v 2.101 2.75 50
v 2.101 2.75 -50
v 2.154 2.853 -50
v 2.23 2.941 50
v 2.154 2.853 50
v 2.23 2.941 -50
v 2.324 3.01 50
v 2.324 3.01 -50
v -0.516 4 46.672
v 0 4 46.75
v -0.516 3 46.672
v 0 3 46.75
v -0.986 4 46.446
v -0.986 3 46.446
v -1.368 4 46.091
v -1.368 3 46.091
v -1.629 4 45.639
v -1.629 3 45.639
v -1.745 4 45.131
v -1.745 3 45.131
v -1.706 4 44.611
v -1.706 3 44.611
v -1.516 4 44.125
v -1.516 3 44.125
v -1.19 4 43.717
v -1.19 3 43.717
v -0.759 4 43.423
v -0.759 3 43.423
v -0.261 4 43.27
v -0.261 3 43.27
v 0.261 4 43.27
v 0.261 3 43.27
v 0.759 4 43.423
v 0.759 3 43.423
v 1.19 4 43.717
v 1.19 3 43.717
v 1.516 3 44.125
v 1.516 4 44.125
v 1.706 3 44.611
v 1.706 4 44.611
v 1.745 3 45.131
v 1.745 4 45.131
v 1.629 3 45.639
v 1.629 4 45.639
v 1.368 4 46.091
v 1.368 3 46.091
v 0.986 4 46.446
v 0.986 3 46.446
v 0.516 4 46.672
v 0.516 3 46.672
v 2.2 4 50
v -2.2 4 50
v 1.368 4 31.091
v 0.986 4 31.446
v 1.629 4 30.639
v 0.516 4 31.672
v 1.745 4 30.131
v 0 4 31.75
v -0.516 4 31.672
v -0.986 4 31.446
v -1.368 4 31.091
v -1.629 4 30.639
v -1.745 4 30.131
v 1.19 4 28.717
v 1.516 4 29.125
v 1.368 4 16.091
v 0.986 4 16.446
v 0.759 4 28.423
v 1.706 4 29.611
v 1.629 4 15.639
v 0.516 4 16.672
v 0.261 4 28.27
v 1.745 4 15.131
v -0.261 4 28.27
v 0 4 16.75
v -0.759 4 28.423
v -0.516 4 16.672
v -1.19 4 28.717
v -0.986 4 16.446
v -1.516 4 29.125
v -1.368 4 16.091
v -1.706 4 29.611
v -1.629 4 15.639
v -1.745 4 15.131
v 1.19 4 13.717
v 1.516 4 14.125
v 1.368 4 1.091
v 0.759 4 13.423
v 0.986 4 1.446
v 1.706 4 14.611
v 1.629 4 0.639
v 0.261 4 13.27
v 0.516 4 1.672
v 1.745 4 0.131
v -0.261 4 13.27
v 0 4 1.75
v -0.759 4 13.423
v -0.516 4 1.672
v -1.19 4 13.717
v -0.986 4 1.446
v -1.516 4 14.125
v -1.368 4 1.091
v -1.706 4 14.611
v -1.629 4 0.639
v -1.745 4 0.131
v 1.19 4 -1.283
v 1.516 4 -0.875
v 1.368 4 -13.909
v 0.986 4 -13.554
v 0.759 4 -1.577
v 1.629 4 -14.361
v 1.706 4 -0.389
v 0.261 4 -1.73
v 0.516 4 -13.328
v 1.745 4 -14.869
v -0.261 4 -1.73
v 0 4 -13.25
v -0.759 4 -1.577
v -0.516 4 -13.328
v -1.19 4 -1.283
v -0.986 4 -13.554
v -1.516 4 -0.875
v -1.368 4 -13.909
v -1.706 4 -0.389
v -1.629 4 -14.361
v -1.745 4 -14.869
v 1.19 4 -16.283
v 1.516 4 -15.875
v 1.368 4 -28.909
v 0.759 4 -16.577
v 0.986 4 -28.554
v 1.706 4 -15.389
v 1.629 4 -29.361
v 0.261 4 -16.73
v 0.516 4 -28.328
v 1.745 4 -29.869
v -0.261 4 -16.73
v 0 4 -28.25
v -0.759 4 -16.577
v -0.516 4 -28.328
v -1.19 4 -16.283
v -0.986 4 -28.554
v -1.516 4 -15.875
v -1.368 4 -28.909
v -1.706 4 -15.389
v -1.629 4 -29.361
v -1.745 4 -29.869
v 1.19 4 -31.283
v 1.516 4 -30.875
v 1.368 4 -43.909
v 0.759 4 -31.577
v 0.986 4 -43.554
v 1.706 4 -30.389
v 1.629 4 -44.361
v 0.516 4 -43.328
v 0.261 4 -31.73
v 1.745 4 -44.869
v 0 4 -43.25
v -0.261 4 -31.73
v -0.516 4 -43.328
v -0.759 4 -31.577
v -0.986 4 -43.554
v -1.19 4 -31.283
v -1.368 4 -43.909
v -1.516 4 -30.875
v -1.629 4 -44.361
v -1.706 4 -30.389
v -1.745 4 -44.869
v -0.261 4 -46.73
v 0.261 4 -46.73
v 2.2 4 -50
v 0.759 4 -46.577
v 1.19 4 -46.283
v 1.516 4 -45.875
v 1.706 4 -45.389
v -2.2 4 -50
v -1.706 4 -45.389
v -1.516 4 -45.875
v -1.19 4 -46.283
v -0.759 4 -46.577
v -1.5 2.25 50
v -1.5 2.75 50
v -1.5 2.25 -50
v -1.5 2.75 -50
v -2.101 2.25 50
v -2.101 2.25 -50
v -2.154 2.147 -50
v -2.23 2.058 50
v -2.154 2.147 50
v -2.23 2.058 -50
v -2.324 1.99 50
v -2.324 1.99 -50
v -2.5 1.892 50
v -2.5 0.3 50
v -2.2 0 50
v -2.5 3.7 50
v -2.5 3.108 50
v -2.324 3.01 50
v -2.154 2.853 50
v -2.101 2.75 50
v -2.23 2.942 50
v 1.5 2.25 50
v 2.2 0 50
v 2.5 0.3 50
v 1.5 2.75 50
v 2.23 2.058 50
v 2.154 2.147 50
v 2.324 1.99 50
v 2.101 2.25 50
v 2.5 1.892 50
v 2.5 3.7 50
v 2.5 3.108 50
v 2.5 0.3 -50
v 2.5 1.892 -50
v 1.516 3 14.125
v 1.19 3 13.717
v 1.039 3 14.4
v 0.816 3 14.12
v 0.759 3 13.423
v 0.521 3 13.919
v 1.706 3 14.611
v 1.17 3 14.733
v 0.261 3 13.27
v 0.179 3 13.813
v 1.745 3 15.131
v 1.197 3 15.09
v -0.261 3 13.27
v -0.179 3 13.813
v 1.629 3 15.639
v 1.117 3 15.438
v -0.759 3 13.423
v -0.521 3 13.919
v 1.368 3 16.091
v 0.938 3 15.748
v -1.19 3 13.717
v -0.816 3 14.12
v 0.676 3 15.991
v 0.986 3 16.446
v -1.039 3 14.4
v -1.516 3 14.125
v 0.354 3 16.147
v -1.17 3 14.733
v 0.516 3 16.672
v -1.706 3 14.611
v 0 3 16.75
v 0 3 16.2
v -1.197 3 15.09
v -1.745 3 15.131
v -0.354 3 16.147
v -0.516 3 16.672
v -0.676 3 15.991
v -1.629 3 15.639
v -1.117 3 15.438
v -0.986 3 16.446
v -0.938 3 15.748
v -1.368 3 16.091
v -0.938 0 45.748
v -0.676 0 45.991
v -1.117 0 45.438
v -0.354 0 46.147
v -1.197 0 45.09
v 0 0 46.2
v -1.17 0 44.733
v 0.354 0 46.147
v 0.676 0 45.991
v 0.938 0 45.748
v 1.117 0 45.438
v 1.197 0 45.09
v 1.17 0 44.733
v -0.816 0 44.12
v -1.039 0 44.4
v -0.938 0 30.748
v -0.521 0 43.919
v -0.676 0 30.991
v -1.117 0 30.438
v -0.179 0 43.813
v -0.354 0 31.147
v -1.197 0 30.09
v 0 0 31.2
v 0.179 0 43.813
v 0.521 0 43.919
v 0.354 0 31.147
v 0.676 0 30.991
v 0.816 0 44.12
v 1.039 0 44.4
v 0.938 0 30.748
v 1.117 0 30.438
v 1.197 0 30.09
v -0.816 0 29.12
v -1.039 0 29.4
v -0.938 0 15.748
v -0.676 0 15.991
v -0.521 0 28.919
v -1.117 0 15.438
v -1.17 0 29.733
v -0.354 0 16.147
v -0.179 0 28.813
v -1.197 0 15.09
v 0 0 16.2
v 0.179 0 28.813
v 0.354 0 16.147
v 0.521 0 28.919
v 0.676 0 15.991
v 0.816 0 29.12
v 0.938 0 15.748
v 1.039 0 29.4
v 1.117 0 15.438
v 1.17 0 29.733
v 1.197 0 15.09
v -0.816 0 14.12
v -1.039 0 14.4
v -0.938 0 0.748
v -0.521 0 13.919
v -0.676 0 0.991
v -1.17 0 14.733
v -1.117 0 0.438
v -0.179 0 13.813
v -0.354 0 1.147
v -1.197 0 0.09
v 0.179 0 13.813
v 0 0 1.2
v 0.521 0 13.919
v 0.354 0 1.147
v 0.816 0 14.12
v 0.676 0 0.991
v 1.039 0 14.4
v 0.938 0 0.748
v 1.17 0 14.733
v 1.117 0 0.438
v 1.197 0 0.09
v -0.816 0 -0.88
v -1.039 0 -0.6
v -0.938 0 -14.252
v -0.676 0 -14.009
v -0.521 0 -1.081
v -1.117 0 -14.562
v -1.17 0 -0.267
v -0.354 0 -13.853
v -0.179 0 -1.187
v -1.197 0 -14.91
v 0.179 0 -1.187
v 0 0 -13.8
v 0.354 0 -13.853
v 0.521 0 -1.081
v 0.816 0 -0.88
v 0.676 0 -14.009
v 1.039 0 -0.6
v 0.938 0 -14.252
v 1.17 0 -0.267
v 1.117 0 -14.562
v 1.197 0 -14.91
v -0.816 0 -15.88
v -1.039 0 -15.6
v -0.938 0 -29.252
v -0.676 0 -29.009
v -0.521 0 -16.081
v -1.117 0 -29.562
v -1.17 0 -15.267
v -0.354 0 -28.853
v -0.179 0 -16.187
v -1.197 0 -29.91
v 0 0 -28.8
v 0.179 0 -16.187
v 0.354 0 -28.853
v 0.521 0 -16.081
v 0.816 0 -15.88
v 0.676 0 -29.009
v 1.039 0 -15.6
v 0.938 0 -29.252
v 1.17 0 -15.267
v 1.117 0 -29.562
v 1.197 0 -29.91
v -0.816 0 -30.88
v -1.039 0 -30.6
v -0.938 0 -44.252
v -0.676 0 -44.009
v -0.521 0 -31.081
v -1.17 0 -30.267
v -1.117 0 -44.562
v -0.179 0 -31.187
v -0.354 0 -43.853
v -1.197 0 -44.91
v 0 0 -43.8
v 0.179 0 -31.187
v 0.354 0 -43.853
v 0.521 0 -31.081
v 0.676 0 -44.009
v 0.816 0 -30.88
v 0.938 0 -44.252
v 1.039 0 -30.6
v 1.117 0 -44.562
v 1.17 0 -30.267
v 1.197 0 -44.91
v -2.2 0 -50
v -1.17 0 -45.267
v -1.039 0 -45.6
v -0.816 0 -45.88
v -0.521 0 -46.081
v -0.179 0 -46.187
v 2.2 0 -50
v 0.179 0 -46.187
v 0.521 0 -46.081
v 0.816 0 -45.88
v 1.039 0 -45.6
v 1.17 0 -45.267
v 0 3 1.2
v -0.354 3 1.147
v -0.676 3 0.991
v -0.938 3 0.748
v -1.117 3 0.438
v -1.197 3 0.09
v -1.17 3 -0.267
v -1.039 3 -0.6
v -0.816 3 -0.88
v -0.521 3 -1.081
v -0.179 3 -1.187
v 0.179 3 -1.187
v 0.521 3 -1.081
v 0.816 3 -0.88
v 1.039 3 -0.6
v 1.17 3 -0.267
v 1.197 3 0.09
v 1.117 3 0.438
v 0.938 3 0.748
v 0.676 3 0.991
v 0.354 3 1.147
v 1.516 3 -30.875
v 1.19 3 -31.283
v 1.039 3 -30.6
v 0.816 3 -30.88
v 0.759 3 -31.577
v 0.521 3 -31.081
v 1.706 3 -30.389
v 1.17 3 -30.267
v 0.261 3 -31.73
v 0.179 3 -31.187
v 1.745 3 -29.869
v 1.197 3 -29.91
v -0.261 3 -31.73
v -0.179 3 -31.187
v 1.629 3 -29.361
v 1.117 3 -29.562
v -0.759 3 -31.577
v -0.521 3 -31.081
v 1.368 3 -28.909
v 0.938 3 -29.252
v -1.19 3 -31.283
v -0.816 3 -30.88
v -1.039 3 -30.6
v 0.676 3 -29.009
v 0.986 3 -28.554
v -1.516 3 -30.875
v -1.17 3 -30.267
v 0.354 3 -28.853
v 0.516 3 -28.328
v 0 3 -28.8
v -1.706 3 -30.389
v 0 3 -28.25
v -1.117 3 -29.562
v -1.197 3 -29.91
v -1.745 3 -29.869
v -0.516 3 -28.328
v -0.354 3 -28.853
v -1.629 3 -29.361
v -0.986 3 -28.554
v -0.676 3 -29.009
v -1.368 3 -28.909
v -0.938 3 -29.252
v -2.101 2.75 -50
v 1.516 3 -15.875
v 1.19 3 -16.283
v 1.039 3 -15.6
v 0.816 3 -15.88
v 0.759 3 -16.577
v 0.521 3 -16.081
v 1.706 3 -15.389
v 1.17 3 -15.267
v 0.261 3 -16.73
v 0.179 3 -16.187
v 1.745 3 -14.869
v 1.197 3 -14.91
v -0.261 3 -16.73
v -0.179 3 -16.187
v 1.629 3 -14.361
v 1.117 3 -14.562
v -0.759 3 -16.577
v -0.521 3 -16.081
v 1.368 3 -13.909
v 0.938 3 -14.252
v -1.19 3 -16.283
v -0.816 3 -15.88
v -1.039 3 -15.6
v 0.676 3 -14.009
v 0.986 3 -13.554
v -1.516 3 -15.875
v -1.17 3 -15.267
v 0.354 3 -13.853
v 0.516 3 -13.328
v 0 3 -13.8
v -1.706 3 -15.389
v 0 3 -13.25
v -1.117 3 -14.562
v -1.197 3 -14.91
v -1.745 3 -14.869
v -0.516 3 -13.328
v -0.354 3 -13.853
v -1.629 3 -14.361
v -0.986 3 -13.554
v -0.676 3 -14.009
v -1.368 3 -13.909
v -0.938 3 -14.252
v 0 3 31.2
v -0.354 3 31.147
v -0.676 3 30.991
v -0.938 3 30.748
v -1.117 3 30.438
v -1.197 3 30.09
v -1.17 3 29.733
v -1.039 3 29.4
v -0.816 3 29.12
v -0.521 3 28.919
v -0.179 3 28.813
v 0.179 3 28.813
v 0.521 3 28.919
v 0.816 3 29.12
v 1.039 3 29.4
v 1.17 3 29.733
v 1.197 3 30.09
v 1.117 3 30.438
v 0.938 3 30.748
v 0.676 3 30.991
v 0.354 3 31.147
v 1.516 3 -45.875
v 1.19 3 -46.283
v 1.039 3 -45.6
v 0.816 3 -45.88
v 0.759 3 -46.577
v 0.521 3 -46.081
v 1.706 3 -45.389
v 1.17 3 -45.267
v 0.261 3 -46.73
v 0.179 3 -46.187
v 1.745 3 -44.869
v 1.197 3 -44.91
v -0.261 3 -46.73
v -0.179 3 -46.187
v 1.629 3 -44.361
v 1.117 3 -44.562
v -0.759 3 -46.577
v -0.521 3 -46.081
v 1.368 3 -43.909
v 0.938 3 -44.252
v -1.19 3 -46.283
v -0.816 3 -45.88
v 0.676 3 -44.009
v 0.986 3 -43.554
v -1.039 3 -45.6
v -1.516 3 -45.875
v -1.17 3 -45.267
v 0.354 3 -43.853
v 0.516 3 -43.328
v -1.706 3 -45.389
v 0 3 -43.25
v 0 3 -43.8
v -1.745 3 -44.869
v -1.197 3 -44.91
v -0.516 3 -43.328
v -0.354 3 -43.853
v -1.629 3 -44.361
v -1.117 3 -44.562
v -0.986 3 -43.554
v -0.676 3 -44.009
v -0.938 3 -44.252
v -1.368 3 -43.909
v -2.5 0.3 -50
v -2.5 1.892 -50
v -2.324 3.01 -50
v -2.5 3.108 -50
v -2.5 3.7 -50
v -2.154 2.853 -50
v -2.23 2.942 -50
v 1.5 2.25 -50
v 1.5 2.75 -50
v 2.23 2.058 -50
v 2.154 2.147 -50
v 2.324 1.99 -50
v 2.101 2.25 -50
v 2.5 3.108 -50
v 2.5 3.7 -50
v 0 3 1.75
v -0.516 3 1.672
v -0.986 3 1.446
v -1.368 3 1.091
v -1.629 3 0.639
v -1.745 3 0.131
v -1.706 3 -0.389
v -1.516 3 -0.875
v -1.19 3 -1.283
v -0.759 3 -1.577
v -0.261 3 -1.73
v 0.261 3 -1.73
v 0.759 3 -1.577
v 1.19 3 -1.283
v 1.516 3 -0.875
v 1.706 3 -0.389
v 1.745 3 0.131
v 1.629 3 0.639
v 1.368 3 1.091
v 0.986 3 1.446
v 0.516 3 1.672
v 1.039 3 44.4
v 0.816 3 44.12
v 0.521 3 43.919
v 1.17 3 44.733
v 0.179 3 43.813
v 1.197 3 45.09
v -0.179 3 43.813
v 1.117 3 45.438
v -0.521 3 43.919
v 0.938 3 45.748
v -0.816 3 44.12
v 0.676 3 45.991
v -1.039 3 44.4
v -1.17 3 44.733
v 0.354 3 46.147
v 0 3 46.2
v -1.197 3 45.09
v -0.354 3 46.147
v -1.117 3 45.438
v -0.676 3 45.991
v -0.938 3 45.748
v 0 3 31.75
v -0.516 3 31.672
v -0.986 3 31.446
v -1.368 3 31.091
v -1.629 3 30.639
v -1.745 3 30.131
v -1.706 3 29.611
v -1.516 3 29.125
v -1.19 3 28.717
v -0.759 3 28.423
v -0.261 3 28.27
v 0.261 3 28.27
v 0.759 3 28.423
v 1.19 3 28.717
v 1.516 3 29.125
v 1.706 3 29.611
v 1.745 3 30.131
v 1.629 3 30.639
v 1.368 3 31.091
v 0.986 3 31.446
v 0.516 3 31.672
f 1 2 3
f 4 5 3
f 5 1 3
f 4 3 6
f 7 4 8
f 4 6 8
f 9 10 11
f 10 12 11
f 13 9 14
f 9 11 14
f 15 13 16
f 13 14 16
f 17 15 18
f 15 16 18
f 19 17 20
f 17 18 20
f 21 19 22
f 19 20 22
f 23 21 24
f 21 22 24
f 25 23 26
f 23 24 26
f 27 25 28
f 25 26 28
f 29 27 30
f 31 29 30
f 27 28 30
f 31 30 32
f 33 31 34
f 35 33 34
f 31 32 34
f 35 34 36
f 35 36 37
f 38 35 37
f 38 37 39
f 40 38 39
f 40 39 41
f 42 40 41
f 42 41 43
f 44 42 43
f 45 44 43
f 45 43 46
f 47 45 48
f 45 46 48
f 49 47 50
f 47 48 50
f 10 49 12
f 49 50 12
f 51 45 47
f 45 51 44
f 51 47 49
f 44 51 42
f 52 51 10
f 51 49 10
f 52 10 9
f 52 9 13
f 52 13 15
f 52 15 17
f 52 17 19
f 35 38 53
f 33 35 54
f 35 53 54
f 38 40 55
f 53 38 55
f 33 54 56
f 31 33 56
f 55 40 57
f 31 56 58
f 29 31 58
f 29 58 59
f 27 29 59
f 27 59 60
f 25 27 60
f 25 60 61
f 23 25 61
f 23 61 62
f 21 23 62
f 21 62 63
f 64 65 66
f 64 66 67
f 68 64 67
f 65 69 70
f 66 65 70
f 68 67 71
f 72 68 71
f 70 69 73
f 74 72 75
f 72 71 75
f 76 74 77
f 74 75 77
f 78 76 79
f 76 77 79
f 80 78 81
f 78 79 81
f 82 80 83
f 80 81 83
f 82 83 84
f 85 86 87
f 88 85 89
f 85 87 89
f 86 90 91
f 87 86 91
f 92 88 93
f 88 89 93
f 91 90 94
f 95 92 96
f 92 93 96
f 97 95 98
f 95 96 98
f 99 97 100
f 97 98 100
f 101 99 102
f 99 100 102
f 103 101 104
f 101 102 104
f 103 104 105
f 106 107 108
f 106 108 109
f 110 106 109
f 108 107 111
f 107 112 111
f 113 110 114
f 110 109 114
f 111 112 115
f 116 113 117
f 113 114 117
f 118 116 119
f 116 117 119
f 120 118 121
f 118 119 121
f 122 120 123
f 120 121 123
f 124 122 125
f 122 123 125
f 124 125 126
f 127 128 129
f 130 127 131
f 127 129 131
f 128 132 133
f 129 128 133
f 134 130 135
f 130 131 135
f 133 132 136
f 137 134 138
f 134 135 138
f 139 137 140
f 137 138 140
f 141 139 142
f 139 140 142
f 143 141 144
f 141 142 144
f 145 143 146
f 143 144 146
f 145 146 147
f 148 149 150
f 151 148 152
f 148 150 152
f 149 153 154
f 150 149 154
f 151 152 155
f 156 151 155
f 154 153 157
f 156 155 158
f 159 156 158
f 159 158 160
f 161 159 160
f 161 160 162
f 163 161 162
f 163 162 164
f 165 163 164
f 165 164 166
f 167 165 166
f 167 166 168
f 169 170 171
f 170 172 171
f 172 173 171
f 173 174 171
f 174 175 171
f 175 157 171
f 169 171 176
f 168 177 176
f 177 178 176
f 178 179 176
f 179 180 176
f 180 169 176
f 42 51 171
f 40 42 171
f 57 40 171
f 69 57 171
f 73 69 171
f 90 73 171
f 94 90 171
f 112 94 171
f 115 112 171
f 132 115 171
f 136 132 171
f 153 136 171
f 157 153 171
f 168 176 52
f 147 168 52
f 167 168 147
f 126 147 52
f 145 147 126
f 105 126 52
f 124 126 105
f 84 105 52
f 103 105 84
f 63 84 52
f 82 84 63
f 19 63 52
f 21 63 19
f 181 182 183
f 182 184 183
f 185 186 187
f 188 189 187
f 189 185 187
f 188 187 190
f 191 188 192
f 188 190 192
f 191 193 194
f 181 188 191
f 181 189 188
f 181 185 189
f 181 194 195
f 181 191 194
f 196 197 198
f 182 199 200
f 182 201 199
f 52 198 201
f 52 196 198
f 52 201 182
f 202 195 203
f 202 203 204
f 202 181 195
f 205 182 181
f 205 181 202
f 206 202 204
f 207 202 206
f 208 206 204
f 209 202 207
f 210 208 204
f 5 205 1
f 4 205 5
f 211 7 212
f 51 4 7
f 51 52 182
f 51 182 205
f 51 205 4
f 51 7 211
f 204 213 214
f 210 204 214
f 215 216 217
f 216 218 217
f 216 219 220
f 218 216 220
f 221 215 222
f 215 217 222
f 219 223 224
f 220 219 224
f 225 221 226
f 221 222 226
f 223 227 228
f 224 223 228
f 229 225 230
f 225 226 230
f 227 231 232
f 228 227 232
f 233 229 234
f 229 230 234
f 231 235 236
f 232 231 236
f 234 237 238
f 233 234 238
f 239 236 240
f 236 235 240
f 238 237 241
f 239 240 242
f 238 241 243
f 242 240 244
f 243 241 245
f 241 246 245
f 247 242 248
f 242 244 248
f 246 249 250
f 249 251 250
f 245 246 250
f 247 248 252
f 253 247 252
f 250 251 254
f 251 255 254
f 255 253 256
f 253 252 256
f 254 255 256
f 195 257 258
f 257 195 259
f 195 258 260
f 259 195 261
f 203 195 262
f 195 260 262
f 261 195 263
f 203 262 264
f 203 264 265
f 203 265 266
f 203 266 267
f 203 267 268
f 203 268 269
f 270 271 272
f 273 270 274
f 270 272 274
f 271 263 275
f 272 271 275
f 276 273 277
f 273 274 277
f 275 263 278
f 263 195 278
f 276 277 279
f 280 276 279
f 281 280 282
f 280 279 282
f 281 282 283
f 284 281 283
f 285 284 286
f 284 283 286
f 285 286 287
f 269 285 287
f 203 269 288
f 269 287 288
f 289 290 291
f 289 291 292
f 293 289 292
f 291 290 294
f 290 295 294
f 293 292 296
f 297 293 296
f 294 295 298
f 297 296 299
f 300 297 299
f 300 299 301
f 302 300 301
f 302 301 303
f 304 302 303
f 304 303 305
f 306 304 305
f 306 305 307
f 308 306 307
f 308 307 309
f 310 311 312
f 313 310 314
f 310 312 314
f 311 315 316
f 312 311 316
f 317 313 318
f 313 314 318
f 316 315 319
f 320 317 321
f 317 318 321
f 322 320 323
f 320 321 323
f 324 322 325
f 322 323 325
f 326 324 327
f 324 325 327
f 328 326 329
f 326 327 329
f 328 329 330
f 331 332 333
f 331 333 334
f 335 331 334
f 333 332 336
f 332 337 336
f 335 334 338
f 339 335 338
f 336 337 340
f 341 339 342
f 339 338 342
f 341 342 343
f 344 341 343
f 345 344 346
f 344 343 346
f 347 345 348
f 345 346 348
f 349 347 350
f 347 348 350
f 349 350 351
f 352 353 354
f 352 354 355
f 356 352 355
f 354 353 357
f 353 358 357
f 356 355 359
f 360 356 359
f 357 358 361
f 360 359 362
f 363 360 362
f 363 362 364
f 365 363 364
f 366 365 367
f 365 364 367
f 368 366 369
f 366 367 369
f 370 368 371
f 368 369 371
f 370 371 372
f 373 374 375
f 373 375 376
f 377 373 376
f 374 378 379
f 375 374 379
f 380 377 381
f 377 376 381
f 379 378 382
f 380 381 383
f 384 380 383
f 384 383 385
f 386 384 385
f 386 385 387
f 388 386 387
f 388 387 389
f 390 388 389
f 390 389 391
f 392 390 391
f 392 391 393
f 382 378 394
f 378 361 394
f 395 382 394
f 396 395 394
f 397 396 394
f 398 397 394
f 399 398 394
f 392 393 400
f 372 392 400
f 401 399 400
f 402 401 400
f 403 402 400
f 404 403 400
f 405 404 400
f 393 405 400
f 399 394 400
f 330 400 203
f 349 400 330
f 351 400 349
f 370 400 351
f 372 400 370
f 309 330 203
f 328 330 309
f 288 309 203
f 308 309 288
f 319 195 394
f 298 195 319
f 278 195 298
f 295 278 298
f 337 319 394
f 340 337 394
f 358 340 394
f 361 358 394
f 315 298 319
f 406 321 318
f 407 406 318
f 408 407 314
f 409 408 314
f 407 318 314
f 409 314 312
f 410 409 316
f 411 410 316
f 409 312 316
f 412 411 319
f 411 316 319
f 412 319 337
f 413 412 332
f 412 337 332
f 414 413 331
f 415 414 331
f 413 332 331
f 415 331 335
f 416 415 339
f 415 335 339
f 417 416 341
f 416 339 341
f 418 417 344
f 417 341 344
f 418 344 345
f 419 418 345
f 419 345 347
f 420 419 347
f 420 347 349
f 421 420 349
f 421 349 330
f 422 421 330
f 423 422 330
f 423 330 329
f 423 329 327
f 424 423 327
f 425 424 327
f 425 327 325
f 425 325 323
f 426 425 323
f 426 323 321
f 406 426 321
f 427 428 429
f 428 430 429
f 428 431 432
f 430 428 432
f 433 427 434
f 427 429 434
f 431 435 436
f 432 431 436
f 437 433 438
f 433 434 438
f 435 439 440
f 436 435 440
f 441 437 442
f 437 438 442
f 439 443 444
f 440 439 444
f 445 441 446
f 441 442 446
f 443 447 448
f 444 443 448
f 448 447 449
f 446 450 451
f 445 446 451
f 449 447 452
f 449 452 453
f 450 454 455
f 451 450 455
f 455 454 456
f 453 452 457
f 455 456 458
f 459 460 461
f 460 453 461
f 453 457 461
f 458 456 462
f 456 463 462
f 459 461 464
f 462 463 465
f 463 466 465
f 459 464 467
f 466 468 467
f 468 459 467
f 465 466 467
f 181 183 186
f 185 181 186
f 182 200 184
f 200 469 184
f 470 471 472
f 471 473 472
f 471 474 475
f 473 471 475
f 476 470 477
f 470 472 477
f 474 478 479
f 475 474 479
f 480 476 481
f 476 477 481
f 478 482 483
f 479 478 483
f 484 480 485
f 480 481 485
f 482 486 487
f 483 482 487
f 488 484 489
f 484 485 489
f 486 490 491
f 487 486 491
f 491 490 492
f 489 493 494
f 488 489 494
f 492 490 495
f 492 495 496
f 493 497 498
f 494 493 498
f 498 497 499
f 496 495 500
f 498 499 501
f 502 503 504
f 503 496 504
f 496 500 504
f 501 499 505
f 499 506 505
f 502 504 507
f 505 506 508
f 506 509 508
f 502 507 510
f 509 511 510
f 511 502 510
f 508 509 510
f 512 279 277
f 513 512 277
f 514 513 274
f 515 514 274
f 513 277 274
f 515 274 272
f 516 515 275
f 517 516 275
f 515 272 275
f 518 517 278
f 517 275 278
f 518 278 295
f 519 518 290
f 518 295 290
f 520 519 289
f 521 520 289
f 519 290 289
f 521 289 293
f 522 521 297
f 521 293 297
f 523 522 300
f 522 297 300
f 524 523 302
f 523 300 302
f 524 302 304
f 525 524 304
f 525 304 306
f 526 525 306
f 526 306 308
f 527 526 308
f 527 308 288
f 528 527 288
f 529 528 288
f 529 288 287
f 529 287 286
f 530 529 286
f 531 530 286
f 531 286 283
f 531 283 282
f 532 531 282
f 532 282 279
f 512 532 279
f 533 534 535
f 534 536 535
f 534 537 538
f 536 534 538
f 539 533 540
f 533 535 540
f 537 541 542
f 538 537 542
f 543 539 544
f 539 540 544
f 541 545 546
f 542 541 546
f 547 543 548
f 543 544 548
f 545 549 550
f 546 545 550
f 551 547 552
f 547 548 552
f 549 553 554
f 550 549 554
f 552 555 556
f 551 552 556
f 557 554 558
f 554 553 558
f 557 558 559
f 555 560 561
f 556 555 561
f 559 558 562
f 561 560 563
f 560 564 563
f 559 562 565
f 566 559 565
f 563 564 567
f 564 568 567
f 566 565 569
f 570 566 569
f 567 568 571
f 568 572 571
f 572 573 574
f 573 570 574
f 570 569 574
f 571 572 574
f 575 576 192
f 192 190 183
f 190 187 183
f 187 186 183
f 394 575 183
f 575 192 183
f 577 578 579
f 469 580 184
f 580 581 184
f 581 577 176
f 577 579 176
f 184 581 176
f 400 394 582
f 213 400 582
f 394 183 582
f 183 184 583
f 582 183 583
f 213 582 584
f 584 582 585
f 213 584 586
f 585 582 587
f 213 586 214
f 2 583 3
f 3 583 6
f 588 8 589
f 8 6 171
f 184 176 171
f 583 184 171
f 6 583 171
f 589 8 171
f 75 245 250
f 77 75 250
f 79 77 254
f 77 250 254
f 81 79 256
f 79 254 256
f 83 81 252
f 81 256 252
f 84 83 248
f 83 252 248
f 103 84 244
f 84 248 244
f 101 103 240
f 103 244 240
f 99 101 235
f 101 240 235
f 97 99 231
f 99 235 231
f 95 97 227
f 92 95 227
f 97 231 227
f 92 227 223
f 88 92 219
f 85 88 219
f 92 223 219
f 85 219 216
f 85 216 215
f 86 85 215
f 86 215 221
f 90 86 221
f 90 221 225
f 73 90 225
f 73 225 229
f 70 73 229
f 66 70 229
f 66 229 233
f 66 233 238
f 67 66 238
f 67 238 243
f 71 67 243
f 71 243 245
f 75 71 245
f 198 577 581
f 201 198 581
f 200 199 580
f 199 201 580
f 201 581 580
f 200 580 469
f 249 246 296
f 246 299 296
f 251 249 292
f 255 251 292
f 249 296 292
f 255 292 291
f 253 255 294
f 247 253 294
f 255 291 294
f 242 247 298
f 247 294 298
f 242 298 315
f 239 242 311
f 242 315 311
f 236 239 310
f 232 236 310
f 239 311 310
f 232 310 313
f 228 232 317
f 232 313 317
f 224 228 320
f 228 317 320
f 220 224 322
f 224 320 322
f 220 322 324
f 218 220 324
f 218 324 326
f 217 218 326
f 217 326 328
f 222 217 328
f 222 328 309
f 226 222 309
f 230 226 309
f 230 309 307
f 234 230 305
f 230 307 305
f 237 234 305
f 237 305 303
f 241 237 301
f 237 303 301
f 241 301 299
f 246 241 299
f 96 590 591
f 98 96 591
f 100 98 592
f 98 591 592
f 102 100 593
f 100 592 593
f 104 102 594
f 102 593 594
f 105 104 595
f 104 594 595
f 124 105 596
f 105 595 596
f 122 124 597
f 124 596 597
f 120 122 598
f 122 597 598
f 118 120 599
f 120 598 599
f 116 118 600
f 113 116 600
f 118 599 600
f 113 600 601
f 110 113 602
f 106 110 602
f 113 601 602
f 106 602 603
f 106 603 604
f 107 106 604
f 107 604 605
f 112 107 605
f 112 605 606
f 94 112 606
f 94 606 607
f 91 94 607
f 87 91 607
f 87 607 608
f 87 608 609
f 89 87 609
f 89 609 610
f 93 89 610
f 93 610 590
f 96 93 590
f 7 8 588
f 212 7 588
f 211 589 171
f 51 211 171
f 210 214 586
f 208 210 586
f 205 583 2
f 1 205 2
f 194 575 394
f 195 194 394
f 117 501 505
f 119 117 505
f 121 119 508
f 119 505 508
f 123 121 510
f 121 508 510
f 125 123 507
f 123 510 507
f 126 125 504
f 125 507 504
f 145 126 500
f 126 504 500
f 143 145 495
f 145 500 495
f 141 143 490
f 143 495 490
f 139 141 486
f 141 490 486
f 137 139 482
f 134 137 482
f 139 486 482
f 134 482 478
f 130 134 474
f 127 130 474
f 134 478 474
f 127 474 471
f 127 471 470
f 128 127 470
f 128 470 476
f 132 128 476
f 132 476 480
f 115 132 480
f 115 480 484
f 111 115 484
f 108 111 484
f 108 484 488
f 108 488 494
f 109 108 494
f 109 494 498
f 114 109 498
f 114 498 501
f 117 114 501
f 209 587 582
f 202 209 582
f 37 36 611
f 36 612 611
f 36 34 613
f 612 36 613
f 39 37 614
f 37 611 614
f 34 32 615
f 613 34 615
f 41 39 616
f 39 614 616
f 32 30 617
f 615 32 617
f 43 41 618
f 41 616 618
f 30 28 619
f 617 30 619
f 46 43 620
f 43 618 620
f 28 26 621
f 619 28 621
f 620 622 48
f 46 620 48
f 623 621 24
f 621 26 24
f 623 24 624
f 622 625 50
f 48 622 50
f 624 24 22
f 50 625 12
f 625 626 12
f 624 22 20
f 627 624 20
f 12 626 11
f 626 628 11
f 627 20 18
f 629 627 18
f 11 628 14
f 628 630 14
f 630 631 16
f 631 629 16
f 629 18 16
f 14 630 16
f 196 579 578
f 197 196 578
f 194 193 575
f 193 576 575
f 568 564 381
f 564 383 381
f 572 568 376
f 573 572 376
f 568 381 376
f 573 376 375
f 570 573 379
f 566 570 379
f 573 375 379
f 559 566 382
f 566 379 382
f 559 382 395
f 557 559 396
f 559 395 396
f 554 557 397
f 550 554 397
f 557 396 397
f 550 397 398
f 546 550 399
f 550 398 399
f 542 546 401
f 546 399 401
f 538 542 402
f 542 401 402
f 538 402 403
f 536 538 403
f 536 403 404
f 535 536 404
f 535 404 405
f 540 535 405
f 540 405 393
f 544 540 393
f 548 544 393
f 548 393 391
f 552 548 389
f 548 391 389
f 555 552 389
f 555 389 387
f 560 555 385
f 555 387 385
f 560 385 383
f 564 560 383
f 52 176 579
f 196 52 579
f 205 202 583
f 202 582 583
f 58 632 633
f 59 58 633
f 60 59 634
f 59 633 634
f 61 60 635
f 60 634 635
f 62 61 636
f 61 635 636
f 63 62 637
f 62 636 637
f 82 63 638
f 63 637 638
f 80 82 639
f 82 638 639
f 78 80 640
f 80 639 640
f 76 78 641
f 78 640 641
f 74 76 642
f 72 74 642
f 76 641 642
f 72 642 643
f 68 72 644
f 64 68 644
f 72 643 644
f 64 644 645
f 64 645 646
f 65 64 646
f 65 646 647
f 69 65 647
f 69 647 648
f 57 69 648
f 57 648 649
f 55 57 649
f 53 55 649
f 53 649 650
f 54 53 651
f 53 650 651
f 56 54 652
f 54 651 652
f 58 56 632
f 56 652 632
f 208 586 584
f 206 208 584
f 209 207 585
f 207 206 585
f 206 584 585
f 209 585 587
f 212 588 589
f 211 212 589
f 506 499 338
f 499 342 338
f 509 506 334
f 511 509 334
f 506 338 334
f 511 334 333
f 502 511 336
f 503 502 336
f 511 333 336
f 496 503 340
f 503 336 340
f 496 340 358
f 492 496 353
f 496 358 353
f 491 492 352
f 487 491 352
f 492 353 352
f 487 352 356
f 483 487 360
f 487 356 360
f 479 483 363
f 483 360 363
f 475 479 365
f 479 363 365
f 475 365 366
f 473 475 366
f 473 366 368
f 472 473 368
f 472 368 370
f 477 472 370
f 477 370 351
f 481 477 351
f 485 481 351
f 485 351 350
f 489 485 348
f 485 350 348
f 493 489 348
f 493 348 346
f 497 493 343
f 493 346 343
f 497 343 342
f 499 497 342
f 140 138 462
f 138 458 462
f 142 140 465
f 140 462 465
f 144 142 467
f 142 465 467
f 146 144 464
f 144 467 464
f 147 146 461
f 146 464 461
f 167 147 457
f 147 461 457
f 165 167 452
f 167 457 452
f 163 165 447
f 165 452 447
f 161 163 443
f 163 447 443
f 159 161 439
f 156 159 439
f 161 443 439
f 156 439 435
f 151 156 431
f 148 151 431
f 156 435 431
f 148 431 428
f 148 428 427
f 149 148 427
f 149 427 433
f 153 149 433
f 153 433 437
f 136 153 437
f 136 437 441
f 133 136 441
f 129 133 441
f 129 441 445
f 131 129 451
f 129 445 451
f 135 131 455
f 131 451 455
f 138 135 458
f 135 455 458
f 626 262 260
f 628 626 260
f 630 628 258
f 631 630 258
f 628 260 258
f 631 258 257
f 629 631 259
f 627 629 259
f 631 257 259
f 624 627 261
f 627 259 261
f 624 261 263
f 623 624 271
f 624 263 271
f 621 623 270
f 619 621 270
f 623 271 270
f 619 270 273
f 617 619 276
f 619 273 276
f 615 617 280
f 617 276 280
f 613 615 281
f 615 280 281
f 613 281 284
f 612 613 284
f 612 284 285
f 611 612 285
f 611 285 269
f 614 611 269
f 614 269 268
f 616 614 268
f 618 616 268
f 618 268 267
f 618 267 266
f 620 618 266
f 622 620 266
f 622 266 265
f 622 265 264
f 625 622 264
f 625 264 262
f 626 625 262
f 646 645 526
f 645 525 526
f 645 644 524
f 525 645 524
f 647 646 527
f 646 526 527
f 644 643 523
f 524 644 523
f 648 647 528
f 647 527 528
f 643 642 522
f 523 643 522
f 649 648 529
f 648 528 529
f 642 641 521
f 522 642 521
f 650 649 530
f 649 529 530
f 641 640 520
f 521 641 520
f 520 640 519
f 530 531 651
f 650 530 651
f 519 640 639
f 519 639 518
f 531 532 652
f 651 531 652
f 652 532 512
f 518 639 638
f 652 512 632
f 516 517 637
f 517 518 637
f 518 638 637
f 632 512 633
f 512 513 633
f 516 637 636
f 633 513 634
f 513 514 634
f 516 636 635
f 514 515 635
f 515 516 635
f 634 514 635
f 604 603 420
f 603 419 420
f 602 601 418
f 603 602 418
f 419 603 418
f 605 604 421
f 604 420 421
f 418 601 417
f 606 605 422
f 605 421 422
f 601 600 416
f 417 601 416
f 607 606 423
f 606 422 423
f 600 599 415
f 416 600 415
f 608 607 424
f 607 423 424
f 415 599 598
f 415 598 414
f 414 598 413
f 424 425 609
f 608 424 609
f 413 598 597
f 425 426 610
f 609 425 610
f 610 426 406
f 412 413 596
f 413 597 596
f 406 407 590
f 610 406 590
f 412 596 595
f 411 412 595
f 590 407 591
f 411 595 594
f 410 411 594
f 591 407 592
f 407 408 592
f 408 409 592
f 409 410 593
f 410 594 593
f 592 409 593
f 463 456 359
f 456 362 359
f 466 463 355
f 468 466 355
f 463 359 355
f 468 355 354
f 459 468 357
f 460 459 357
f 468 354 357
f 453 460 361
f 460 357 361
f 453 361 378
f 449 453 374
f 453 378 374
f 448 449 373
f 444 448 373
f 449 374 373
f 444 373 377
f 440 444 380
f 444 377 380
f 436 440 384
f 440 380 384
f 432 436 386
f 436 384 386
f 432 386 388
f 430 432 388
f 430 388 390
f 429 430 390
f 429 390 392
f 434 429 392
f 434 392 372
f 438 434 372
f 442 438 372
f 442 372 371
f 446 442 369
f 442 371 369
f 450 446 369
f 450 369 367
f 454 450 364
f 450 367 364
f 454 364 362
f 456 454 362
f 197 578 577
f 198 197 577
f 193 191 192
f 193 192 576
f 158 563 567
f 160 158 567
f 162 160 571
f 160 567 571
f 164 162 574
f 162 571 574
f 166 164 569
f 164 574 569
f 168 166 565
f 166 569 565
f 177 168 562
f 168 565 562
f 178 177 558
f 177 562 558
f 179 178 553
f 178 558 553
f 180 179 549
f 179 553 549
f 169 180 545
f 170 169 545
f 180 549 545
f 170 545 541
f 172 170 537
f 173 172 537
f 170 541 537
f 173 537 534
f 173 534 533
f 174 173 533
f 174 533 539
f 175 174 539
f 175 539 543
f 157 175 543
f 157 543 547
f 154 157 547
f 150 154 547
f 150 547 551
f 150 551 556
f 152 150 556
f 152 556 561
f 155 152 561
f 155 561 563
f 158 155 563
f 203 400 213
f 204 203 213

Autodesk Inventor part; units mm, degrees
sketch "Sketch_12" plane through (0, 0, 0) normal (0, 0, 1) x (1, 0, 0)
  line L0 (-2.5, 3.7) -> (-2.5, 3.1084)
  line L1 (-2.5, 3.1084) -> (-2.3242, 3.0098)
  arc A0 (-2.1007, 2.75) -> (-2.3242, 3.0098) centre (-2.5686, 2.5736) ccw
  line L2 (-2.1007, 2.75) -> (-1.5, 2.75)
  line L3 (-1.5, 2.75) -> (-1.5, 2.25)
  line L4 (-1.5, 2.25) -> (-2.1007, 2.25)
  arc A1 (-2.3242, 1.9902) -> (-2.1007, 2.25) centre (-2.5686, 2.4264) ccw
  line L5 (-2.3242, 1.9902) -> (-2.5, 1.8917)
  line L6 (-2.5, 1.8917) -> (-2.5, 0.3)
  line L7 (-2.5, 0.3) -> (-2.2, 0)
  line L8 (-2.2, 0) -> (2.2, 0)
  line L9 (2.2, 0) -> (2.5, 0.3)
  line L10 (2.5, 0.3) -> (2.5, 1.8917)
  line L11 (2.5, 1.8917) -> (2.3242, 1.9902)
  arc A2 (2.1007, 2.25) -> (2.3242, 1.9902) centre (2.5686, 2.4263) ccw
  line L12 (2.1007, 2.25) -> (1.5, 2.25)
  line L13 (1.5, 2.25) -> (1.5, 2.75)
  line L14 (1.5, 2.75) -> (2.1007, 2.75)
  arc A3 (2.3242, 3.0098) -> (2.1007, 2.75) centre (2.5686, 2.5737) ccw
  line L15 (2.3242, 3.0098) -> (2.5, 3.1084)
  line L16 (2.5, 3.1084) -> (2.5, 3.7)
  line L17 (2.5, 3.7) -> (2.2, 4)
  line L18 (2.2, 4) -> (-2.2, 4)
  line L19 (-2.2, 4) -> (-2.5, 3.7)
extrude "Extrusion1" add sketch "Sketch_12" along normal mid plane 100
sketch "Sketch2" plane through (-2.2, 4, 50) normal (0, 1, 0) x (1, 0, 0)
  point P0 (2.2, 95)
hole "Hole1" at (0, 4, -45) direction (0, -1, 0) diameter 2.4 depth 4 counterbore diameter 3.5 counterbore depth 1
pattern_linear "Rectangular Pattern1" count 7 spacing 15 along (0, 0, 1) of "Hole1"
ref_plane "rail_to_adjusting_block_XY" through (0, 0, -45) normal (0, 1, 0) x (1, 0, 0)
ref_plane "rail_to_adjusting_block_YZ" through (0, 0, -45) normal (1, 0, 0) x (0, 0, -1)
ref_plane "rail_to_adjusting_block_ZX" through (0, 0, -45) normal (0, 0, -1) x (0, 1, 0)
ref_plane "screw_1_XY" through (0, 3, 45) normal (0, -1, 0) x (1, 0, 0)
ref_plane "screw_1_YZ" through (0, 3, 45) normal (1, 0, 0) x (0, 0, 1)
ref_plane "screw_1_ZX" through (0, 3, 45) normal (0, 0, 1) x (0, -1, 0)
ref_plane "screw_2_XY" through (0, 3, 30) normal (0, -1, 0) x (1, 0, 0)
ref_plane "screw_2_YZ" through (0, 3, 30) normal (1, 0, 0) x (0, 0, 1)
ref_plane "screw_2_ZX" through (0, 3, 30) normal (0, 0, 1) x (0, -1, 0)
ref_plane "screw_3_XY" through (0, 3, 15) normal (0, -1, 0) x (1, 0, 0)
ref_plane "screw_3_YZ" through (0, 3, 15) normal (1, 0, 0) x (0, 0, 1)
ref_plane "screw_3_ZX" through (0, 3, 15) normal (0, 0, 1) x (0, -1, 0)
ref_plane "screw_4_XY" through (0, 3, 0) normal (0, -1, 0) x (1, 0, 0)
ref_plane "screw_4_YZ" through (0, 3, 0) normal (1, 0, 0) x (0, 0, 1)
ref_plane "screw_4_ZX" through (0, 3, 0) normal (0, 0, 1) x (0, -1, 0)
ref_plane "screw_5_XY" through (0, 3, -15) normal (0, -1, 0) x (1, 0, 0)
ref_plane "screw_5_YZ" through (0, 3, -15) normal (1, 0, 0) x (0, 0, 1)
ref_plane "screw_5_ZX" through (0, 3, -15) normal (0, 0, 1) x (0, -1, 0)
ref_plane "screw_6_XY" through (0, 3, -30) normal (0, -1, 0) x (1, 0, 0)
ref_plane "screw_6_YZ" through (0, 3, -30) normal (1, 0, 0) x (0, 0, 1)
ref_plane "screw_6_ZX" through (0, 3, -30) normal (0, 0, 1) x (0, -1, 0)
ref_plane "screw_7_XY" through (0, 3, -45) normal (0, -1, 0) x (1, 0, 0)
ref_plane "screw_7_YZ" through (0, 3, -45) normal (1, 0, 0) x (0, 0, 1)
ref_plane "screw_7_ZX" through (0, 3, -45) normal (0, 0, 1) x (0, -1, 0)
ref_plane "to_block_XY" through (0, 4, 25) normal (0, 0, 1) x (1, 0, 0)
ref_plane "to_block_YZ" through (0, 4, 25) normal (1, 0, 0) x (0, 1, 0)
ref_plane "to_block_ZX" through (0, 4, 25) normal (0, 1, 0) x (0, 0, 1)
ref_plane "to_block_2_XY" through (0, 4, -25) normal (0, 0, 1) x (1, 0, 0)
ref_plane "to_block_2_YZ" through (0, 4, -25) normal (1, 0, 0) x (0, 1, 0)
ref_plane "to_block_2_ZX" through (0, 4, -25) normal (0, 1, 0) x (0, 0, 1)
ref_plane "to_kue_XY" through (0, 0, 0) normal (0, 1, 0) x (1, 0, 0)
ref_plane "to_kue_YZ" through (0, 0, 0) normal (1, 0, 0) x (0, 0, -1)
ref_plane "to_kue_ZX" through (0, 0, 0) normal (0, 0, -1) x (0, 1, 0)
properties part number "SSE2B6-100_r"
